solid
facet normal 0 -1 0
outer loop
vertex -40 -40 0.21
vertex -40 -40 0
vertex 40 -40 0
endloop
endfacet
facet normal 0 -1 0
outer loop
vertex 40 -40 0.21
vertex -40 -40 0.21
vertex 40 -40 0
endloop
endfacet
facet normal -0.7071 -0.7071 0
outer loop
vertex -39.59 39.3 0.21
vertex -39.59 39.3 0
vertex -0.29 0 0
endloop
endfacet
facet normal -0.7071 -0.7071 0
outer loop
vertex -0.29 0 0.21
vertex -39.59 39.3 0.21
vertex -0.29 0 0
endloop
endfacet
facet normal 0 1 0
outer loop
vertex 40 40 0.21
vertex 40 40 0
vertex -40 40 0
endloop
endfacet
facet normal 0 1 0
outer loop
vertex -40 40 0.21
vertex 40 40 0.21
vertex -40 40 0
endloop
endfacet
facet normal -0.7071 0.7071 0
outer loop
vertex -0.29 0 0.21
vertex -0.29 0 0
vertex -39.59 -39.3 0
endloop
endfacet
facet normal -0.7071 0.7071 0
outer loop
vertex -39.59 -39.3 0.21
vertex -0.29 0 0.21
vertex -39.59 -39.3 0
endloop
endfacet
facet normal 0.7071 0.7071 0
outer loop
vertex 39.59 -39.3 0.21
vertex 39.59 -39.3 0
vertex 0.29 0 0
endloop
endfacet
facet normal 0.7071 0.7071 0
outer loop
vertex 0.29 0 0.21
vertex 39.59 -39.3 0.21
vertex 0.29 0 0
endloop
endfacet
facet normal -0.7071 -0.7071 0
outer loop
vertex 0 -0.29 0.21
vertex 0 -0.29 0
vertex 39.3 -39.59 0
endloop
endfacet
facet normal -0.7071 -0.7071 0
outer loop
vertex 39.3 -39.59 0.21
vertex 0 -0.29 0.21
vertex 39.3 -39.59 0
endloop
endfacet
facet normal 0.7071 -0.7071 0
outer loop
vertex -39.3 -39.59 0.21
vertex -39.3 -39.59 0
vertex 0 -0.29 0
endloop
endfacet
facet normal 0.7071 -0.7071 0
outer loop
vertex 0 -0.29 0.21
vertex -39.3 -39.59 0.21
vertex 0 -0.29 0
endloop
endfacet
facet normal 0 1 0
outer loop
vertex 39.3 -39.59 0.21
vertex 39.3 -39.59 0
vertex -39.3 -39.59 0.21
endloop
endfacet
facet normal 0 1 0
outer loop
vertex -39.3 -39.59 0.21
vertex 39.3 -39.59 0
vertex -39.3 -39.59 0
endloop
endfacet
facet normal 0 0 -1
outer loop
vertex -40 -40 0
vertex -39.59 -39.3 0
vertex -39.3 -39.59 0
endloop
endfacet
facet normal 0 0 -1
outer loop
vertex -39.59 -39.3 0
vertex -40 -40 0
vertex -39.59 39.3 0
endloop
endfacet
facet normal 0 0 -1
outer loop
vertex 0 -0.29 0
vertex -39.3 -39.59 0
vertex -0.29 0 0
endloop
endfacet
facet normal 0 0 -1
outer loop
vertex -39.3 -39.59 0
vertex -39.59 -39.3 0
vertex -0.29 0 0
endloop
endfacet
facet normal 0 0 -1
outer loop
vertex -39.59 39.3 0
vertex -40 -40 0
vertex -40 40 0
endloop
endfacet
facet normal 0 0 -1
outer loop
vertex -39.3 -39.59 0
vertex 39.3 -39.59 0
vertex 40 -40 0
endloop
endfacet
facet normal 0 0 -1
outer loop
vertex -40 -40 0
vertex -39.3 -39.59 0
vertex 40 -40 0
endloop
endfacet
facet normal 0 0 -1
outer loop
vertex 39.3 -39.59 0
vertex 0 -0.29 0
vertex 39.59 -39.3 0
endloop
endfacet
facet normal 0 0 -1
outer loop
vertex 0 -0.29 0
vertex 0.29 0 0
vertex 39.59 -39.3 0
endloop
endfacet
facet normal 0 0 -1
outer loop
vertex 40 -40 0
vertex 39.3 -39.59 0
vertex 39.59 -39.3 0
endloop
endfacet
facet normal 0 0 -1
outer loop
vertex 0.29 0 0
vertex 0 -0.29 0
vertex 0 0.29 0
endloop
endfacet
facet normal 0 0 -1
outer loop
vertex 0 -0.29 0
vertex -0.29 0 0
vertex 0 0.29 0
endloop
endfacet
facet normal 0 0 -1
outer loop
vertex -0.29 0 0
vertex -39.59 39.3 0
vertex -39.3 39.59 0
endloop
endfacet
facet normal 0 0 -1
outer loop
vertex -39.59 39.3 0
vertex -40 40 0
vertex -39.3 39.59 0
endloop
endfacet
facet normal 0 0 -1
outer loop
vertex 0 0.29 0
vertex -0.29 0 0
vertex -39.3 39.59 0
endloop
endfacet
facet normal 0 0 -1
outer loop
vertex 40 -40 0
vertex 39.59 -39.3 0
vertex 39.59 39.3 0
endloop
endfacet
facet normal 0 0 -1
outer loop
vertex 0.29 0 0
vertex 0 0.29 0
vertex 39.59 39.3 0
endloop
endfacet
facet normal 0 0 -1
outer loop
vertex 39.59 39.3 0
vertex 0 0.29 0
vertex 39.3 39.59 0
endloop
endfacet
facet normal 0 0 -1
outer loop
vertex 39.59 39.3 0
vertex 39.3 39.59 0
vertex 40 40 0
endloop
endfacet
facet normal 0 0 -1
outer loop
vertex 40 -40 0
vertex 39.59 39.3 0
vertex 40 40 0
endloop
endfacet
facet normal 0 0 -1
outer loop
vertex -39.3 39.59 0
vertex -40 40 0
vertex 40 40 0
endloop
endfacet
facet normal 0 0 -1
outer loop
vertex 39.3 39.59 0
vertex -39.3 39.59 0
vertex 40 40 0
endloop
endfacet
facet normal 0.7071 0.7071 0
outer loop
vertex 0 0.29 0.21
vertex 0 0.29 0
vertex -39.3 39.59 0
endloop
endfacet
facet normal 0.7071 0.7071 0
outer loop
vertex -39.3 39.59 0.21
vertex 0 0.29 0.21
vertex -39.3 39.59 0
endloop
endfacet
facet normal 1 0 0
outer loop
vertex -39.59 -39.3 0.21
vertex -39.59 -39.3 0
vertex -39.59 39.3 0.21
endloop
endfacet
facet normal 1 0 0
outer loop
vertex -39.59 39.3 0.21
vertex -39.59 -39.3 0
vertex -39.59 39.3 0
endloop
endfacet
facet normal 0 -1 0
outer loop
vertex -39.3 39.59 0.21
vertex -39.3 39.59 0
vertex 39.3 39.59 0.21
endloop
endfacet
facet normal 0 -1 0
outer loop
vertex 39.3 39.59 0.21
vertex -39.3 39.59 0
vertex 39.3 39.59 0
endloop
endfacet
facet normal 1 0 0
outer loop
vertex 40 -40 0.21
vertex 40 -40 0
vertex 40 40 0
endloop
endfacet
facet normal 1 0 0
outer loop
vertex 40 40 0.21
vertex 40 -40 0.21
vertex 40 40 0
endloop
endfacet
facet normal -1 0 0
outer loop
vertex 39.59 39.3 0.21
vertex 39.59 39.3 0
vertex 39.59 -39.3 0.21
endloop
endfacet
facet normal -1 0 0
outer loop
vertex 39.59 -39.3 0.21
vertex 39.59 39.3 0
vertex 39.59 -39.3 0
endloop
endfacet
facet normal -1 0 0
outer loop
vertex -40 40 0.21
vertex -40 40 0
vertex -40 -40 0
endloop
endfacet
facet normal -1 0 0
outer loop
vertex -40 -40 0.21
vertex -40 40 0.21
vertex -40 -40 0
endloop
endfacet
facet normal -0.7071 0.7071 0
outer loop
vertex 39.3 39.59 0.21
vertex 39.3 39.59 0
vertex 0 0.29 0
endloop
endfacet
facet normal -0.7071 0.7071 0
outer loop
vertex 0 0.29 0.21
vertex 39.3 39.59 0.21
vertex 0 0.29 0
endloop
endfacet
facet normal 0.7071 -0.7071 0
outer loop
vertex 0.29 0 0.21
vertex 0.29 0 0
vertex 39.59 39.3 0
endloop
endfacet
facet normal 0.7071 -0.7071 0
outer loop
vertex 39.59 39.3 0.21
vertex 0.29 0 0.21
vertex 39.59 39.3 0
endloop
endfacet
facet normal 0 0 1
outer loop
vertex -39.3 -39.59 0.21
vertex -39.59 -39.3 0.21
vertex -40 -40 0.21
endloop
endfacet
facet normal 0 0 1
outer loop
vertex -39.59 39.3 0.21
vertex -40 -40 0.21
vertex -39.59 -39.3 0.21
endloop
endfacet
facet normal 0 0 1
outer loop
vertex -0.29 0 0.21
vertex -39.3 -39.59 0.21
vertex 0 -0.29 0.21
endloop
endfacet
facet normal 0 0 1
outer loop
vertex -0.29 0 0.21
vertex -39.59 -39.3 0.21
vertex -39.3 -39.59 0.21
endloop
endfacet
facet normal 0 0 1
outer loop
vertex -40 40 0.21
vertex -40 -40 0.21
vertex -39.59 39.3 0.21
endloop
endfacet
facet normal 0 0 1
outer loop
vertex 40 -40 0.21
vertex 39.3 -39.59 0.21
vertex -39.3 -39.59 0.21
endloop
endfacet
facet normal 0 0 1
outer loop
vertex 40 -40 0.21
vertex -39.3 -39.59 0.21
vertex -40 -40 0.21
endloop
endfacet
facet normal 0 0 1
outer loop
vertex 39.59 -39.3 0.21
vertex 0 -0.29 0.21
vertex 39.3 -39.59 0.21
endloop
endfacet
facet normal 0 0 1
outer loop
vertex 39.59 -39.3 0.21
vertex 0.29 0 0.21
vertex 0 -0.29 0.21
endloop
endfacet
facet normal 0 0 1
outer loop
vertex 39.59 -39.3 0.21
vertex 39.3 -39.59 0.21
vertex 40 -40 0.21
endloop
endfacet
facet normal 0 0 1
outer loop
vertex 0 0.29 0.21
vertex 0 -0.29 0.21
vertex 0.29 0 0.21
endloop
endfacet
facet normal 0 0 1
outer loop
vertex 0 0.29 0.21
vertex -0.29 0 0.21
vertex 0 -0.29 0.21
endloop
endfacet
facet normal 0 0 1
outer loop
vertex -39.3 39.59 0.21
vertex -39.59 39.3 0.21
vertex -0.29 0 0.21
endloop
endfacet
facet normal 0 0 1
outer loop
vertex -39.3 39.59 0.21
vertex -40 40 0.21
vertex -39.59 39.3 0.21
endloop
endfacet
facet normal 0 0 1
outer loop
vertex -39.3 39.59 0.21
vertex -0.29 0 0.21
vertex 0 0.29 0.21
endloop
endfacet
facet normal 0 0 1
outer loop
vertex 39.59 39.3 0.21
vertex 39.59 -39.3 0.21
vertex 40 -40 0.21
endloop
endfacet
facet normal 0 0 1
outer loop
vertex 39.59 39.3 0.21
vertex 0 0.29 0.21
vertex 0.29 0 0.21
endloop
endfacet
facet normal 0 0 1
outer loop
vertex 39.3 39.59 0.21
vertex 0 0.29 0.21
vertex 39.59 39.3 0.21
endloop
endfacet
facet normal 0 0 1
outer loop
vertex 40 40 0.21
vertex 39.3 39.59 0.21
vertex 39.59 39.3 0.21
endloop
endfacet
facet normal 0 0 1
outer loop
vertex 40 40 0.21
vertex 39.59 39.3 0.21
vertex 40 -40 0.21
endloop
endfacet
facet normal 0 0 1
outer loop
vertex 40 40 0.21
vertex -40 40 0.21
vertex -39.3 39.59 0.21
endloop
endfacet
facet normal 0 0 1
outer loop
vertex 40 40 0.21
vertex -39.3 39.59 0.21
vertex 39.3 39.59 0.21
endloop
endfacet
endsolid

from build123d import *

# Parameters (mm, degrees)
F2_DEPTH = 0.21


with BuildPart() as f2:
    # F1 (on Top) → F2 (new body)
    with BuildSketch(Plane.XY):
        Polygon((-40, 40), (-40, 0), (-39.59, 0), (-39.59, 39.3000862197), (-39.59, 39.59), (-39.3000862197, 39.59), (0, 39.59), (0, 40), align=None)
        Polygon((-40, -40), (40, -40), (40, 40), (0, 40), (0, 39.59), (39.3000862197, 39.59), (39.59, 39.59), (39.59, 39.3000862197), (39.59, -39.3000862197), (39.59, -39.59), (39.3000862197, -39.59), (-39.3000862197, -39.59), (-39.59, -39.59), (-39.59, -39.3000862197), (-39.59, 0), (-40, 0), align=None)
        Polygon((-39.59, 39.59), (-39.59, 39.3000862197), (-0.2899137803, 0), (-0.1449568901, 0.1449568901), align=None)
        Polygon((0, 0.2899137803), (-39.3000862197, 39.59), (-39.59, 39.59), (-0.1449568901, 0.1449568901), align=None)
        Polygon((39.59, 39.59), (39.3000862197, 39.59), (0, 0.2899137803), (0.1449568901, 0.1449568901), align=None)
        Polygon((39.59, 39.3000862197), (39.59, 39.59), (0.1449568901, 0.1449568901), (0.2899137803, 0), align=None)
        Polygon((0.2899137803, 0), (0.1449568901, 0.1449568901), (0, 0), (0.1449568901, -0.1449568901), align=None)
        Polygon((0.1449568901, 0.1449568901), (0, 0.2899137803), (-0.1449568901, 0.1449568901), (0, 0), align=None)
        Polygon((-0.1449568901, 0.1449568901), (-0.2899137803, 0), (-0.1449568901, -0.1449568901), (0, 0), align=None)
        Polygon((0, 0), (-0.1449568901, -0.1449568901), (0, -0.2899137803), (0.1449568901, -0.1449568901), align=None)
        Polygon((0, -0.2899137803), (39.3000862197, -39.59), (39.59, -39.59), (0.1449568901, -0.1449568901), align=None)
        Polygon((39.59, -39.59), (39.59, -39.3000862197), (0.2899137803, 0), (0.1449568901, -0.1449568901), align=None)
        Polygon((-0.1449568901, -0.1449568901), (-39.59, -39.59), (-39.3000862197, -39.59), (0, -0.2899137803), align=None)
        Polygon((-0.2899137803, 0), (-39.59, -39.3000862197), (-39.59, -39.59), (-0.1449568901, -0.1449568901), align=None)
    extrude(amount=F2_DEPTH)


solid = f2.part
